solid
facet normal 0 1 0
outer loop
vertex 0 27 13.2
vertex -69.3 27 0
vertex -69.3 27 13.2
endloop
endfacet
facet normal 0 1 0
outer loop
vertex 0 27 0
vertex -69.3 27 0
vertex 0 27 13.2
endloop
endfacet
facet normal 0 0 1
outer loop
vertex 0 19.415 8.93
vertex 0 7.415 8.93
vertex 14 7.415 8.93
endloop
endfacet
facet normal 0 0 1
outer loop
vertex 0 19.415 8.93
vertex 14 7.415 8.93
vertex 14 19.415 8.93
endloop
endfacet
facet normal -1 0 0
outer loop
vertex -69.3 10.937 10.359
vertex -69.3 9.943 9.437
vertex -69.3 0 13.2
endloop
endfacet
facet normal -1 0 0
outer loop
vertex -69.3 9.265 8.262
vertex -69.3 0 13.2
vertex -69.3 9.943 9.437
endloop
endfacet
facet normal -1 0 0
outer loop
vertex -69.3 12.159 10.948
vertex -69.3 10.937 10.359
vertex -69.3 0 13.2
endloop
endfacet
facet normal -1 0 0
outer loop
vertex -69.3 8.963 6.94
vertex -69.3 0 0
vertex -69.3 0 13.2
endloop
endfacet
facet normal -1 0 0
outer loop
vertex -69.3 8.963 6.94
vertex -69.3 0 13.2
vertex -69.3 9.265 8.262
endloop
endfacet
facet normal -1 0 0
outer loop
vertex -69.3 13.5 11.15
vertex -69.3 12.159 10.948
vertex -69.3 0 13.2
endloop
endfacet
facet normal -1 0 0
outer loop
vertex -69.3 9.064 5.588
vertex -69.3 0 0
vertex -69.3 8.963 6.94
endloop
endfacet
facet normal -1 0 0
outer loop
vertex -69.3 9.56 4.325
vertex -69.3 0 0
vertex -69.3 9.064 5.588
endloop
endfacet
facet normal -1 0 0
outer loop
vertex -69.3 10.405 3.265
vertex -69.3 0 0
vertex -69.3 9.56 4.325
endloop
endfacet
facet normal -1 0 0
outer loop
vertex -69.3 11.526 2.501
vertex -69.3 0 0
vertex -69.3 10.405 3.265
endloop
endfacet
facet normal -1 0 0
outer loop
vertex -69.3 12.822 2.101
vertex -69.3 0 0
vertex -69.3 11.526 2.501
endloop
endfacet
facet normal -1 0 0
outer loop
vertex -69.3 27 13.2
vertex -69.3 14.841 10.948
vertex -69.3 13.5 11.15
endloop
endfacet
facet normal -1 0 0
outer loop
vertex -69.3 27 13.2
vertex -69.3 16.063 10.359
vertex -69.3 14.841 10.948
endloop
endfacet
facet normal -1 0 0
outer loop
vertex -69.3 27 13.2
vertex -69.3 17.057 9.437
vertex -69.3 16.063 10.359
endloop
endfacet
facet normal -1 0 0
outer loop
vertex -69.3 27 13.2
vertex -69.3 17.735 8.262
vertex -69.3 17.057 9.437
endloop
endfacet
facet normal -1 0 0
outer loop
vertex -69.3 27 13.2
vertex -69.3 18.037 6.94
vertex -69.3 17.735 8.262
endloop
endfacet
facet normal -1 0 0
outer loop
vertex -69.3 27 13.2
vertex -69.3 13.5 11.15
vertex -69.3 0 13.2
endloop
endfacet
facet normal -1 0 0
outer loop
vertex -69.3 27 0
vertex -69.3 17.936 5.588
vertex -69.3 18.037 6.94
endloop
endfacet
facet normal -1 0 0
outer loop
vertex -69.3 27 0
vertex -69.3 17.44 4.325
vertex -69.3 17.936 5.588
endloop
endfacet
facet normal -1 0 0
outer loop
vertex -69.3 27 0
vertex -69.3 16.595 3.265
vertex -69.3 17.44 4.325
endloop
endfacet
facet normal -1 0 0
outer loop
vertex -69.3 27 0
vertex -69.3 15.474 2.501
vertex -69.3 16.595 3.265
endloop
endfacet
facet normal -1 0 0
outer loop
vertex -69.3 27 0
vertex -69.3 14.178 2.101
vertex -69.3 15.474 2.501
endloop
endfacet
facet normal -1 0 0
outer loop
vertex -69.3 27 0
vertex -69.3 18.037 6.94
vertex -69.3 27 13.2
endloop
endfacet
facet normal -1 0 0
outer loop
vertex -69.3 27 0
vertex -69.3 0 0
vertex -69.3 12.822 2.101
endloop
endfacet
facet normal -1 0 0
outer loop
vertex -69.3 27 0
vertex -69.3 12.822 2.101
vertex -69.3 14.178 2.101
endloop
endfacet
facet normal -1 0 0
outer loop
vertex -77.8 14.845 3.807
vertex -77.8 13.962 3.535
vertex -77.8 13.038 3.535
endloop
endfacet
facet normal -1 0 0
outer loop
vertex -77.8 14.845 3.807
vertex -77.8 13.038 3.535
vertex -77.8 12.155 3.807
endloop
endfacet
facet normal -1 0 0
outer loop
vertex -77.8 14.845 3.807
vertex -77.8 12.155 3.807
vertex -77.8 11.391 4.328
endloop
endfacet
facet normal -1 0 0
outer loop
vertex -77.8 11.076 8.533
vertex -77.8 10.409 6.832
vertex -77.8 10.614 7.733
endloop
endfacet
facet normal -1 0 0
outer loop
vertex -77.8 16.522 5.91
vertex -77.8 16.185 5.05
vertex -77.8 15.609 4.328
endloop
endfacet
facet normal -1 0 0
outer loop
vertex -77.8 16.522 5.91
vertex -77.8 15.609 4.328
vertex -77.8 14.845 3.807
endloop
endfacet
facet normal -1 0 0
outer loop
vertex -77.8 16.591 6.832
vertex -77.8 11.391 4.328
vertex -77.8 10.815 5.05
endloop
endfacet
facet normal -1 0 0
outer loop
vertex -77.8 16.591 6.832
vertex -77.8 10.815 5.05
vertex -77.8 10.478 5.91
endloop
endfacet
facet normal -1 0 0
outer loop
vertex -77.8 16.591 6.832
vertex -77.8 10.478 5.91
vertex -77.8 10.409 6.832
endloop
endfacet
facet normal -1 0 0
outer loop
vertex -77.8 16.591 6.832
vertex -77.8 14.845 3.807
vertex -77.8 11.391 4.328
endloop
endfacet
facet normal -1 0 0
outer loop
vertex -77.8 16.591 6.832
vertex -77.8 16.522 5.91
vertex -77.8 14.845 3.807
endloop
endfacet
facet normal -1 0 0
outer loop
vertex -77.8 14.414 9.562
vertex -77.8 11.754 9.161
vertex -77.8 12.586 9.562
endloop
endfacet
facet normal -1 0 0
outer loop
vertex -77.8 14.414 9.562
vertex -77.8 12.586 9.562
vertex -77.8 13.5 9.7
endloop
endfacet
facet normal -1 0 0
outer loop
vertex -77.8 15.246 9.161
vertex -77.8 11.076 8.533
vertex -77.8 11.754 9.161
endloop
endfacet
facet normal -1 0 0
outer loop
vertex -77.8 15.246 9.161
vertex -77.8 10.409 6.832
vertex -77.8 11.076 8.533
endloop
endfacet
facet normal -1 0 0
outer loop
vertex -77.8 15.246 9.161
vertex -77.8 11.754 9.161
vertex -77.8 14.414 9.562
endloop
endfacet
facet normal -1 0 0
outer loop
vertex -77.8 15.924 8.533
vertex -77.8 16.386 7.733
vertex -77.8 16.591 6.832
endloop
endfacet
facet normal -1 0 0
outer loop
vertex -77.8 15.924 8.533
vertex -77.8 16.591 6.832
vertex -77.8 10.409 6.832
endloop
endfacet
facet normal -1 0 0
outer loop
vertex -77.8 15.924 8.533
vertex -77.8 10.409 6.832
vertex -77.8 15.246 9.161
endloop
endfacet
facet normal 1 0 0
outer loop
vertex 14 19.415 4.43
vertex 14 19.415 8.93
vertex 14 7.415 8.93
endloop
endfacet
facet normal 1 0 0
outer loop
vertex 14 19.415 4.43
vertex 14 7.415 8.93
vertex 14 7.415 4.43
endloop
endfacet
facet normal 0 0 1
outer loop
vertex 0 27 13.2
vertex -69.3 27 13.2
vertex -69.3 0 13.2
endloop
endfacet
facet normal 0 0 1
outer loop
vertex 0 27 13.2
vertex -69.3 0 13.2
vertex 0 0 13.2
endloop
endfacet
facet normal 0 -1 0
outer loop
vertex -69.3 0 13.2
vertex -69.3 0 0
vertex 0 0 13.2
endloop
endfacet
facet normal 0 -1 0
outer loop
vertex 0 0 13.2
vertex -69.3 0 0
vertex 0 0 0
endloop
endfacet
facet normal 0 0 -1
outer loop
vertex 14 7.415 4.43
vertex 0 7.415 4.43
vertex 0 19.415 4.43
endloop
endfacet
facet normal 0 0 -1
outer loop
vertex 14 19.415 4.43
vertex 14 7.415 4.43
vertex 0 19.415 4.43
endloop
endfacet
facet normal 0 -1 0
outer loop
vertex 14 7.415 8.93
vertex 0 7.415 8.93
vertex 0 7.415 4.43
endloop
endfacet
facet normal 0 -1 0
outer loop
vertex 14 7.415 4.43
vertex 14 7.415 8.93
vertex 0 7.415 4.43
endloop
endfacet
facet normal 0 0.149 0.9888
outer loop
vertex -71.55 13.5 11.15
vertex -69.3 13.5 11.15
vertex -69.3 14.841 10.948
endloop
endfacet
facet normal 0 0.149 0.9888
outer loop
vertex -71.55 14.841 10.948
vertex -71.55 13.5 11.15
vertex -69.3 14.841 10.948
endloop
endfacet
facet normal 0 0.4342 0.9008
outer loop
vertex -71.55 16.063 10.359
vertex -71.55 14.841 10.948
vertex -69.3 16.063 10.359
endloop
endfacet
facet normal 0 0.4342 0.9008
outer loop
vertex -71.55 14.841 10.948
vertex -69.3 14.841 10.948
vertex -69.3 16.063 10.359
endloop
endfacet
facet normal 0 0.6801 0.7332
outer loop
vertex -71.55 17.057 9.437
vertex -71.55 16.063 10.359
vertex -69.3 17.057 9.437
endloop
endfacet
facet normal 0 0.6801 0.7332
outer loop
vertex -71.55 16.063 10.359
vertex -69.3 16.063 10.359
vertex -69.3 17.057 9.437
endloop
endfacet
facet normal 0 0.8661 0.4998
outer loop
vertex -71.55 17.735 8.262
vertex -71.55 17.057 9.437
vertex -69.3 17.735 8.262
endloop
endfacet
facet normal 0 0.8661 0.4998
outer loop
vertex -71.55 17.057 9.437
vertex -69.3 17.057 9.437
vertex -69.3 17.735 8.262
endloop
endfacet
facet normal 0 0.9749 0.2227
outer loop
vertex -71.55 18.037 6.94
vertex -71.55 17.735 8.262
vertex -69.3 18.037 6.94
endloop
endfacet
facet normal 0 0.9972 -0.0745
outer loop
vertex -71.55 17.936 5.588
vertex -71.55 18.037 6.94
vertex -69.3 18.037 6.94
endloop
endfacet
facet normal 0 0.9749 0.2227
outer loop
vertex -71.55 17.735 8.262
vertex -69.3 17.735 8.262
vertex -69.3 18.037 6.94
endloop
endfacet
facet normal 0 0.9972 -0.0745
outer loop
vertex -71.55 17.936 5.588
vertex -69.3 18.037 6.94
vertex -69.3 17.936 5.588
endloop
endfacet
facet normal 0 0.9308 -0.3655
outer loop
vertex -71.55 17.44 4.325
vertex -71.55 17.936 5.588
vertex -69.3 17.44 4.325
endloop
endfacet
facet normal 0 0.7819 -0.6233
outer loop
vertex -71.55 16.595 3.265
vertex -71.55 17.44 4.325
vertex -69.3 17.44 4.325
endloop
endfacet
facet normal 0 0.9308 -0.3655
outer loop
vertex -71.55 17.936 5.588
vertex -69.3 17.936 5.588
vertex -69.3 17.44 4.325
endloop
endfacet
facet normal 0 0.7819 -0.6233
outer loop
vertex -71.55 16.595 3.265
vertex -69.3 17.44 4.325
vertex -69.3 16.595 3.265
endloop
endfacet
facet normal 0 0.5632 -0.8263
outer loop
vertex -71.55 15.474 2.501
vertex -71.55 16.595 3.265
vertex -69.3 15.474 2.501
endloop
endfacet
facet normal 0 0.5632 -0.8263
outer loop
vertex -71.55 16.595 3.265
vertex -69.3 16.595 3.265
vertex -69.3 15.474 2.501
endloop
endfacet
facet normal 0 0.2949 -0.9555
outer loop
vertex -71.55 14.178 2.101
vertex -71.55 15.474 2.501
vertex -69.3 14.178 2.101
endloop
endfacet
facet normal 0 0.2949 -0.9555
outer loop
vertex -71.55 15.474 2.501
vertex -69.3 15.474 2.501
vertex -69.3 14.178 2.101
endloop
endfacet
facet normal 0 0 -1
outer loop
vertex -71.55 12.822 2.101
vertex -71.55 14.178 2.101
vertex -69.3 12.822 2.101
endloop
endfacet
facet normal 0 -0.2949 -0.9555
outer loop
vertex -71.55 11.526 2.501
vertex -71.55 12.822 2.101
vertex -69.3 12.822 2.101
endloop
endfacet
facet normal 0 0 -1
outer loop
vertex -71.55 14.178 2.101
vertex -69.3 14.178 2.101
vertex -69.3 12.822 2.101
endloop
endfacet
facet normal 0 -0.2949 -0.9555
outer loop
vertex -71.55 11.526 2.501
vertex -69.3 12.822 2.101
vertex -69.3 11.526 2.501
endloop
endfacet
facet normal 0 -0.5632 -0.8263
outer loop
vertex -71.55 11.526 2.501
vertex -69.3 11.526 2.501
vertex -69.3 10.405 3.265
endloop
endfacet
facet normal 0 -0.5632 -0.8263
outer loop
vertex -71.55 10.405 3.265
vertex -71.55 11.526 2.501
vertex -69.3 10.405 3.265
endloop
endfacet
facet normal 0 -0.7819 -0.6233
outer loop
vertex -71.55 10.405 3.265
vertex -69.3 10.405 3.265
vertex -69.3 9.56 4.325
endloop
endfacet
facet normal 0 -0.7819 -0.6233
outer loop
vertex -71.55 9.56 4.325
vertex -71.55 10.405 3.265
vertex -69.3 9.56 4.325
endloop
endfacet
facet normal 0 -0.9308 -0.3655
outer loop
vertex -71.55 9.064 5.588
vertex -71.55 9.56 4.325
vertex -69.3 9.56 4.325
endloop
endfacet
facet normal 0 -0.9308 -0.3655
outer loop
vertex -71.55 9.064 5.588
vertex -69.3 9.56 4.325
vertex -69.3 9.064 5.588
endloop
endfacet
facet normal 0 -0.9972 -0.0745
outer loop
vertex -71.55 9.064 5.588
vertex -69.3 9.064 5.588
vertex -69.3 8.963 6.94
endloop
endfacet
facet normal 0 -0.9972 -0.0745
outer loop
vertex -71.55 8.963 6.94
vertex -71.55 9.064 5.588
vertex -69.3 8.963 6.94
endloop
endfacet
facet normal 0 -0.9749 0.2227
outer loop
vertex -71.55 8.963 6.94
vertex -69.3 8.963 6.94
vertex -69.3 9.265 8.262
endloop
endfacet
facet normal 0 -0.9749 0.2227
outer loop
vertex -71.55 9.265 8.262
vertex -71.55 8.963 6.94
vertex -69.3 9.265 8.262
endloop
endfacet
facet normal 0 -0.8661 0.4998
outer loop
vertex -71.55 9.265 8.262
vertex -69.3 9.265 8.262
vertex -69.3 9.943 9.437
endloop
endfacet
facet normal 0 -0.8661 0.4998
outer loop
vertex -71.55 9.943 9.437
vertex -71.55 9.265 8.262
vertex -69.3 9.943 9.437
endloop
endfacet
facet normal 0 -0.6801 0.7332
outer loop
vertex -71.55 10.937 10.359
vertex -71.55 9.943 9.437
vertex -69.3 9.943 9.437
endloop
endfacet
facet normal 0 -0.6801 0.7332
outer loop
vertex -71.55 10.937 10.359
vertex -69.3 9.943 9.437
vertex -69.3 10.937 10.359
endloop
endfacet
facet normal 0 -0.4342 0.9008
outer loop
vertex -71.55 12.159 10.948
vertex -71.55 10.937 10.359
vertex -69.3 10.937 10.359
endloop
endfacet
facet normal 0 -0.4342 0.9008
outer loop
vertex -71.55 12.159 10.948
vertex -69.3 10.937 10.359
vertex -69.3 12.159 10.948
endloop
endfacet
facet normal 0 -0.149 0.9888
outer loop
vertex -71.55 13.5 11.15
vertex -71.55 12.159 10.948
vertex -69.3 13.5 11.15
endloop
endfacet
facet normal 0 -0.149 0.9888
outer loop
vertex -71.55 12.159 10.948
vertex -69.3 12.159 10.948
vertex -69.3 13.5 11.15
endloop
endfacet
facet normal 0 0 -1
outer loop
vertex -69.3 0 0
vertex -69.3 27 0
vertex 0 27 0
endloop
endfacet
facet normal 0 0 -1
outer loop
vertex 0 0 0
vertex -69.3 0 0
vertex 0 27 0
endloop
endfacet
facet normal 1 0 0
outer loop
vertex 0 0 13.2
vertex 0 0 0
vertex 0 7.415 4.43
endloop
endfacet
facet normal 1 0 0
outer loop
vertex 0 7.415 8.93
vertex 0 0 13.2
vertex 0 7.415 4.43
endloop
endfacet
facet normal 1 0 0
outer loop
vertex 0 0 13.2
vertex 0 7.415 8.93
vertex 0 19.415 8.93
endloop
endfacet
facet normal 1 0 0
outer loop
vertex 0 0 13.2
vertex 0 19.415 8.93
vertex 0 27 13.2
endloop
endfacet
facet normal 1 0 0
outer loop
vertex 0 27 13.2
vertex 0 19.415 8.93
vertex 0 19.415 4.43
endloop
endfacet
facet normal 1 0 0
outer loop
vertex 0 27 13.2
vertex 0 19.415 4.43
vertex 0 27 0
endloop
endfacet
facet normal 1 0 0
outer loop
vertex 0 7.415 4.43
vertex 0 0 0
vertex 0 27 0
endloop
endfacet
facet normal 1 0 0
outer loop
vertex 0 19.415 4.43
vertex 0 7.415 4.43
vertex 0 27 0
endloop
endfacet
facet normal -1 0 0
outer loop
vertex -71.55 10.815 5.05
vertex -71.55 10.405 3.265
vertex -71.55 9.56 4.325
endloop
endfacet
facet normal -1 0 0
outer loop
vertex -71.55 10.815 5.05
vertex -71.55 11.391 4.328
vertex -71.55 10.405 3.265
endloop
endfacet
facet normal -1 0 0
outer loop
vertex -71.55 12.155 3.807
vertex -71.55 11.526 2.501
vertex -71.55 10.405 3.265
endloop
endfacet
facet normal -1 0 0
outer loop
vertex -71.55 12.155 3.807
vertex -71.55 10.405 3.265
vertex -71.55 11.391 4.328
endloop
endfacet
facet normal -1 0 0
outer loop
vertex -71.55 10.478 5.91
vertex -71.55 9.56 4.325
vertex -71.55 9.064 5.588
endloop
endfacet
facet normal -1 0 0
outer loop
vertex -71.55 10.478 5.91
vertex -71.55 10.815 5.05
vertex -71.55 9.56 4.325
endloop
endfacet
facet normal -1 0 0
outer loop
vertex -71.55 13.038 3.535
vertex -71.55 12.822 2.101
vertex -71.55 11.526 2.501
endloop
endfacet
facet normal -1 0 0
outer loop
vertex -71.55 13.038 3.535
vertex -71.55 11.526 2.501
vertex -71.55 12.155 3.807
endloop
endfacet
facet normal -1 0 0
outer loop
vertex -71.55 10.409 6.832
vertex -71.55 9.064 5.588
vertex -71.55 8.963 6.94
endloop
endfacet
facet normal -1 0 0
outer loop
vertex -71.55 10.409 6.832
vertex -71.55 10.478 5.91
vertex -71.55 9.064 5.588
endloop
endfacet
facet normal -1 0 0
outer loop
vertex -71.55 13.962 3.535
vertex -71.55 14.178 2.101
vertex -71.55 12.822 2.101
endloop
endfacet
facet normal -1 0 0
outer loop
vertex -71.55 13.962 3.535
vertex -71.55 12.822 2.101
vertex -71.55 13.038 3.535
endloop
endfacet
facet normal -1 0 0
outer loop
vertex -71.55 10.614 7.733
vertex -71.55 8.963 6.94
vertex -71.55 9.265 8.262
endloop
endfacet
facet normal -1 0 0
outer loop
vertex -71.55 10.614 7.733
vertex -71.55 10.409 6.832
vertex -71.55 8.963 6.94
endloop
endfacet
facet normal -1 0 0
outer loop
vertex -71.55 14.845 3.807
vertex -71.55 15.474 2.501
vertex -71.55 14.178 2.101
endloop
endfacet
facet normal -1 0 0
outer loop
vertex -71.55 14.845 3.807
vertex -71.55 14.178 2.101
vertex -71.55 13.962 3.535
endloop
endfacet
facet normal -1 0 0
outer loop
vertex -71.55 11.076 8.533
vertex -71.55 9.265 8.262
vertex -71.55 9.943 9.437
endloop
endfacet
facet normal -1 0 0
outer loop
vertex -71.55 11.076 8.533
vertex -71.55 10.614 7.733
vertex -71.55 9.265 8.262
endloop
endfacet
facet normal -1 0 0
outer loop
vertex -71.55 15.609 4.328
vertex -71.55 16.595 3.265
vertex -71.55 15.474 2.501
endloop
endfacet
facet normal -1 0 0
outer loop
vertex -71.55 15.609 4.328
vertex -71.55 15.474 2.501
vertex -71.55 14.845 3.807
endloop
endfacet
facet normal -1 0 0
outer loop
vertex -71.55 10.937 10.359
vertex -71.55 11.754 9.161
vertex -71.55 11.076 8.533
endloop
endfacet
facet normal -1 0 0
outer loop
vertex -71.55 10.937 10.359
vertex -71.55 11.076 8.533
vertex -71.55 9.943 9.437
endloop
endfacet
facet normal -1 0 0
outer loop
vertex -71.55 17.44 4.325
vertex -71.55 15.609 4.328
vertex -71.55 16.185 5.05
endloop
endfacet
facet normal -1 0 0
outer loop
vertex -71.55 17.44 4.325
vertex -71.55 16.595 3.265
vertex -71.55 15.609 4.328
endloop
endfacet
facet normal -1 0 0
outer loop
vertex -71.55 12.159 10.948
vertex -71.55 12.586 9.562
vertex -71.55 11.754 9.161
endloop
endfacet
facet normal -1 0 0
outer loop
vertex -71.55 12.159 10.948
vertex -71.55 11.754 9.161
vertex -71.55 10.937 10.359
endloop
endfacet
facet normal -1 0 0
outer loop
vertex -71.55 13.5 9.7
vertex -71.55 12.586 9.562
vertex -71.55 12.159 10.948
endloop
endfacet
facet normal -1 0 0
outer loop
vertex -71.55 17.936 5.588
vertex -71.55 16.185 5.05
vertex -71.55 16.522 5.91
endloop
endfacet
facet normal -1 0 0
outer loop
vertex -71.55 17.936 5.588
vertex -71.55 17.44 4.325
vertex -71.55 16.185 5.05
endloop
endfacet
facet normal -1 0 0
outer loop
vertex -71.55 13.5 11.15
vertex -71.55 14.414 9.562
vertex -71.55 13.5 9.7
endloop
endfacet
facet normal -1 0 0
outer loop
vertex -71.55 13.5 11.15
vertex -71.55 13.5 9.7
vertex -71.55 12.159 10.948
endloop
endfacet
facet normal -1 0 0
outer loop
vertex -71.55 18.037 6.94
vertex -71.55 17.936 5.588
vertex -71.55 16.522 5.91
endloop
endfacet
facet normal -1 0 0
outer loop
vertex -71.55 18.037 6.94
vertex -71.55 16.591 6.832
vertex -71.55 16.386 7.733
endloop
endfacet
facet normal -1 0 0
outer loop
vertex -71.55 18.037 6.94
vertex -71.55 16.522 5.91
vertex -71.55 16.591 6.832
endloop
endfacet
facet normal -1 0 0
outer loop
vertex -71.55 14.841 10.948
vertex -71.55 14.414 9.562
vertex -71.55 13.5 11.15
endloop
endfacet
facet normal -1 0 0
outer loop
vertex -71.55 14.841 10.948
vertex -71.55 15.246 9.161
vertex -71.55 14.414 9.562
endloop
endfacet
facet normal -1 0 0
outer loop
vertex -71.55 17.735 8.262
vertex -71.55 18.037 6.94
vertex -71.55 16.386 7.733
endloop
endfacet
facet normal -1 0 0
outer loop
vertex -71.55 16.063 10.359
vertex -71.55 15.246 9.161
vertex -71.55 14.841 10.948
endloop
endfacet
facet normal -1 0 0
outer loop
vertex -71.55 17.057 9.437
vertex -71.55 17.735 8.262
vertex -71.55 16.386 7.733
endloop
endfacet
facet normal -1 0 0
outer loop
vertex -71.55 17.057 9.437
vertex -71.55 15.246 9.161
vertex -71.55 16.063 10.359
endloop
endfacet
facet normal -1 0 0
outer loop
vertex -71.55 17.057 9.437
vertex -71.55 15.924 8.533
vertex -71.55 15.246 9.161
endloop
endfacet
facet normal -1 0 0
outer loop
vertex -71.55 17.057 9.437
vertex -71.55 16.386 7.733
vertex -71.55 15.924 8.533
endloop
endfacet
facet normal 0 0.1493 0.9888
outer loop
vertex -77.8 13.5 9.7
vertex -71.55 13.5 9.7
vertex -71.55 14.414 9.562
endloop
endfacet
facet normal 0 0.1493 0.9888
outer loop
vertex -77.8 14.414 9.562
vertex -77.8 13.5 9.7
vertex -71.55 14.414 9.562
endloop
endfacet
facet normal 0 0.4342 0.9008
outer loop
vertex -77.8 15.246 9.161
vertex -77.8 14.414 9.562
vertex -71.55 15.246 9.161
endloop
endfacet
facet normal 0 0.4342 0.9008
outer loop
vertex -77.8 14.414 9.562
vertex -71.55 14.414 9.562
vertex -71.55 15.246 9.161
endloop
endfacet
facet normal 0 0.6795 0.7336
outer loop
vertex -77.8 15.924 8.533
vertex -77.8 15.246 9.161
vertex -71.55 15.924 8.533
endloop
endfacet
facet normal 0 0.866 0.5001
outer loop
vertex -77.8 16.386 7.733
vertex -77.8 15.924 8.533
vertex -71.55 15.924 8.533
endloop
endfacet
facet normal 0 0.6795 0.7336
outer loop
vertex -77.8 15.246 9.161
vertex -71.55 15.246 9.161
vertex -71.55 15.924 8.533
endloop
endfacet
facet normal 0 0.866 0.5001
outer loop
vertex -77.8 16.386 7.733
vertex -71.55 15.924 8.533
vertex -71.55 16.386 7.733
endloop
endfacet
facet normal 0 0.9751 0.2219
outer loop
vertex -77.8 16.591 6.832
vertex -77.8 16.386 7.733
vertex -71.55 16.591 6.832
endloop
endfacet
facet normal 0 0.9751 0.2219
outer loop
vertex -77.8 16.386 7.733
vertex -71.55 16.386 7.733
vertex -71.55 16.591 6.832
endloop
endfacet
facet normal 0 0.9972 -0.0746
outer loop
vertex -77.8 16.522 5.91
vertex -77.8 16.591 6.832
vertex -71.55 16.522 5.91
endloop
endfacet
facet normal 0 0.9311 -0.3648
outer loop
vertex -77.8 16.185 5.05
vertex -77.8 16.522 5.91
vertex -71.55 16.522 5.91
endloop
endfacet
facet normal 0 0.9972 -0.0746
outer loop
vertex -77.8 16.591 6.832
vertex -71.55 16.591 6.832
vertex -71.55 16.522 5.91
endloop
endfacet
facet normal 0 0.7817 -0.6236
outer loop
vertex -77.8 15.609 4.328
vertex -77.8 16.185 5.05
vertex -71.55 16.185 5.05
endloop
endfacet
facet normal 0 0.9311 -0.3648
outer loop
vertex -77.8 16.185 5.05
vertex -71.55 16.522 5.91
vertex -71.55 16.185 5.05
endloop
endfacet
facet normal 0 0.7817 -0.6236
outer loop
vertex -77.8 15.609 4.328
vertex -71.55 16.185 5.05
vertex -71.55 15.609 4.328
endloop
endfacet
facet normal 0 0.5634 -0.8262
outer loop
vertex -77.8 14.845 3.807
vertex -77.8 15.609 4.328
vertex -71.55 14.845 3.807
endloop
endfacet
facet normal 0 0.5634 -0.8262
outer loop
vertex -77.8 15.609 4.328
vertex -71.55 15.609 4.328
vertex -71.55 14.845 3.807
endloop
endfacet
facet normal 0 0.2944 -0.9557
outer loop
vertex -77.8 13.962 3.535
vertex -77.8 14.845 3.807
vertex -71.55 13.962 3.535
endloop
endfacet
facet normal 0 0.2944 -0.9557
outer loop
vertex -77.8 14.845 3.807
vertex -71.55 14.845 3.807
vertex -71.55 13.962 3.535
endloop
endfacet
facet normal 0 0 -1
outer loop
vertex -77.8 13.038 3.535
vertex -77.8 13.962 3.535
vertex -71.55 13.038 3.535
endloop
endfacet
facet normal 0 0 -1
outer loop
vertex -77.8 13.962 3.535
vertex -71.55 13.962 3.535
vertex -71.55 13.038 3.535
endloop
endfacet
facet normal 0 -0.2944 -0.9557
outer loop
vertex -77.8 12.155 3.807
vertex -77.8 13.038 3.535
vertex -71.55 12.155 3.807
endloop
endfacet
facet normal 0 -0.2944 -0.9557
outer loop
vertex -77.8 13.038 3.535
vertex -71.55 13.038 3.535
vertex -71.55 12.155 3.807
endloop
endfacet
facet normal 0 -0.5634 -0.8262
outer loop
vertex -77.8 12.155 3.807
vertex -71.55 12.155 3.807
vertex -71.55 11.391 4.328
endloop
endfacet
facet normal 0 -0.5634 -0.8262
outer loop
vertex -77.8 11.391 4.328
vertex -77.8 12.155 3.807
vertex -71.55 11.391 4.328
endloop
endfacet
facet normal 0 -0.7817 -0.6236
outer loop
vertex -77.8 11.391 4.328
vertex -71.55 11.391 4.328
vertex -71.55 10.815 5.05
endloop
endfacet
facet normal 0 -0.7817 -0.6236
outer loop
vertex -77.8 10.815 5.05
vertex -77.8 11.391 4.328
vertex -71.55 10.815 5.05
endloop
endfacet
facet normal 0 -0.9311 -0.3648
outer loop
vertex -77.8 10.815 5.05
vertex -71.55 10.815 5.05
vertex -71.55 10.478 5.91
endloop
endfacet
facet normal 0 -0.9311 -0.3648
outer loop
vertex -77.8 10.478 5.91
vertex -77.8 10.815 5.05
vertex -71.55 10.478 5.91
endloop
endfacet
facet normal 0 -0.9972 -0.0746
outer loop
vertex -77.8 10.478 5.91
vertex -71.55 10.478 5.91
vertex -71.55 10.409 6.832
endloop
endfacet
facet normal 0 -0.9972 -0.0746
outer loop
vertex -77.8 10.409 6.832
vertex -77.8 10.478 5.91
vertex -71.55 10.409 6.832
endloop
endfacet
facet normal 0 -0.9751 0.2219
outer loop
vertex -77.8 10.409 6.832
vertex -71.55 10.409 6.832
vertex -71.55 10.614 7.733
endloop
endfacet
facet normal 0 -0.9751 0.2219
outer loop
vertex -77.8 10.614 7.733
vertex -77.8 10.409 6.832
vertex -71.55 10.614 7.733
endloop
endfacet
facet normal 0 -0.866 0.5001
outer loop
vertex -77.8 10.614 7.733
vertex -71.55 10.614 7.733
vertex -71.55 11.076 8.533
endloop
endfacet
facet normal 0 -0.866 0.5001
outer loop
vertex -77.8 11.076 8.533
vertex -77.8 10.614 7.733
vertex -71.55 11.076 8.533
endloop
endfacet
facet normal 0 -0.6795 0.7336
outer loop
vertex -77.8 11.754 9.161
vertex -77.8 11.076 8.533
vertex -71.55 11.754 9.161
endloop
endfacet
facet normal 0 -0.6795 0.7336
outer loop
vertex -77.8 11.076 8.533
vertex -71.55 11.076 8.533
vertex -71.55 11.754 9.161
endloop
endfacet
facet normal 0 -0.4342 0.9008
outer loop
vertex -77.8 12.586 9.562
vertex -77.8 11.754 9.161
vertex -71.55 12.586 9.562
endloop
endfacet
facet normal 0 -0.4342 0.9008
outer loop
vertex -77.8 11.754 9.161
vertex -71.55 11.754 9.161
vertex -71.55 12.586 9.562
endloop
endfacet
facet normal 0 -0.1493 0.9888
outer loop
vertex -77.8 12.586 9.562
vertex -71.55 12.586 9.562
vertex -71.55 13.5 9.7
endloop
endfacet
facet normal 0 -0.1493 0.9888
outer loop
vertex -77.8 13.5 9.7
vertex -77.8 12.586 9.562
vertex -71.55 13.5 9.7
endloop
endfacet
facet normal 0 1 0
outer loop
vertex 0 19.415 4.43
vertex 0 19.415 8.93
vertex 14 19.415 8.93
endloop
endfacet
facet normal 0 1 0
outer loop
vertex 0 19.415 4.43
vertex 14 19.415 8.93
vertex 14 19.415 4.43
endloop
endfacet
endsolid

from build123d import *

# Parameters (mm, degrees)
SKETCH1_W           = 69.3
SKETCH1_H           = 27
BOSS_EXTRUDE1_DEPTH = 13.2
SKETCH2_R           = 4.55
BOSS_EXTRUDE2_DEPTH = 2.25
SKETCH3_R           = 3.1
BOSS_EXTRUDE3_DEPTH = 6.25
SKETCH4_W           = 4.5
SKETCH4_H           = 12
BOSS_EXTRUDE4_DEPTH = 14


with BuildPart() as part:
    # Sketch1 → Boss-Extrude1 (new body)
    with BuildSketch(Plane.XY):
        with Locations((-34.65, 13.5)):
            Rectangle(SKETCH1_W, SKETCH1_H)
    extrude(amount=BOSS_EXTRUDE1_DEPTH)

    # Sketch2 → Boss-Extrude2 (add)
    with BuildSketch(Plane.ZY.offset(69.3)):
        with Locations((6.6, 13.5)):
            Circle(SKETCH2_R)
    extrude(amount=BOSS_EXTRUDE2_DEPTH)

    # Sketch3 → Boss-Extrude3 (add)
    with BuildSketch(Plane.ZY.offset(71.55)):
        with Locations((6.6, 13.5)):
            Circle(SKETCH3_R)
    extrude(amount=BOSS_EXTRUDE3_DEPTH)

    # Sketch4 → Boss-Extrude4 (add)
    with BuildSketch(Plane(origin=(0, 0, 0), x_dir=(0, 0, -1), z_dir=(1, 0, 0))):
        with Locations((-6.68005531, 13.414910597)):
            Rectangle(SKETCH4_W, SKETCH4_H)
    extrude(amount=BOSS_EXTRUDE4_DEPTH)


solid = part.part
